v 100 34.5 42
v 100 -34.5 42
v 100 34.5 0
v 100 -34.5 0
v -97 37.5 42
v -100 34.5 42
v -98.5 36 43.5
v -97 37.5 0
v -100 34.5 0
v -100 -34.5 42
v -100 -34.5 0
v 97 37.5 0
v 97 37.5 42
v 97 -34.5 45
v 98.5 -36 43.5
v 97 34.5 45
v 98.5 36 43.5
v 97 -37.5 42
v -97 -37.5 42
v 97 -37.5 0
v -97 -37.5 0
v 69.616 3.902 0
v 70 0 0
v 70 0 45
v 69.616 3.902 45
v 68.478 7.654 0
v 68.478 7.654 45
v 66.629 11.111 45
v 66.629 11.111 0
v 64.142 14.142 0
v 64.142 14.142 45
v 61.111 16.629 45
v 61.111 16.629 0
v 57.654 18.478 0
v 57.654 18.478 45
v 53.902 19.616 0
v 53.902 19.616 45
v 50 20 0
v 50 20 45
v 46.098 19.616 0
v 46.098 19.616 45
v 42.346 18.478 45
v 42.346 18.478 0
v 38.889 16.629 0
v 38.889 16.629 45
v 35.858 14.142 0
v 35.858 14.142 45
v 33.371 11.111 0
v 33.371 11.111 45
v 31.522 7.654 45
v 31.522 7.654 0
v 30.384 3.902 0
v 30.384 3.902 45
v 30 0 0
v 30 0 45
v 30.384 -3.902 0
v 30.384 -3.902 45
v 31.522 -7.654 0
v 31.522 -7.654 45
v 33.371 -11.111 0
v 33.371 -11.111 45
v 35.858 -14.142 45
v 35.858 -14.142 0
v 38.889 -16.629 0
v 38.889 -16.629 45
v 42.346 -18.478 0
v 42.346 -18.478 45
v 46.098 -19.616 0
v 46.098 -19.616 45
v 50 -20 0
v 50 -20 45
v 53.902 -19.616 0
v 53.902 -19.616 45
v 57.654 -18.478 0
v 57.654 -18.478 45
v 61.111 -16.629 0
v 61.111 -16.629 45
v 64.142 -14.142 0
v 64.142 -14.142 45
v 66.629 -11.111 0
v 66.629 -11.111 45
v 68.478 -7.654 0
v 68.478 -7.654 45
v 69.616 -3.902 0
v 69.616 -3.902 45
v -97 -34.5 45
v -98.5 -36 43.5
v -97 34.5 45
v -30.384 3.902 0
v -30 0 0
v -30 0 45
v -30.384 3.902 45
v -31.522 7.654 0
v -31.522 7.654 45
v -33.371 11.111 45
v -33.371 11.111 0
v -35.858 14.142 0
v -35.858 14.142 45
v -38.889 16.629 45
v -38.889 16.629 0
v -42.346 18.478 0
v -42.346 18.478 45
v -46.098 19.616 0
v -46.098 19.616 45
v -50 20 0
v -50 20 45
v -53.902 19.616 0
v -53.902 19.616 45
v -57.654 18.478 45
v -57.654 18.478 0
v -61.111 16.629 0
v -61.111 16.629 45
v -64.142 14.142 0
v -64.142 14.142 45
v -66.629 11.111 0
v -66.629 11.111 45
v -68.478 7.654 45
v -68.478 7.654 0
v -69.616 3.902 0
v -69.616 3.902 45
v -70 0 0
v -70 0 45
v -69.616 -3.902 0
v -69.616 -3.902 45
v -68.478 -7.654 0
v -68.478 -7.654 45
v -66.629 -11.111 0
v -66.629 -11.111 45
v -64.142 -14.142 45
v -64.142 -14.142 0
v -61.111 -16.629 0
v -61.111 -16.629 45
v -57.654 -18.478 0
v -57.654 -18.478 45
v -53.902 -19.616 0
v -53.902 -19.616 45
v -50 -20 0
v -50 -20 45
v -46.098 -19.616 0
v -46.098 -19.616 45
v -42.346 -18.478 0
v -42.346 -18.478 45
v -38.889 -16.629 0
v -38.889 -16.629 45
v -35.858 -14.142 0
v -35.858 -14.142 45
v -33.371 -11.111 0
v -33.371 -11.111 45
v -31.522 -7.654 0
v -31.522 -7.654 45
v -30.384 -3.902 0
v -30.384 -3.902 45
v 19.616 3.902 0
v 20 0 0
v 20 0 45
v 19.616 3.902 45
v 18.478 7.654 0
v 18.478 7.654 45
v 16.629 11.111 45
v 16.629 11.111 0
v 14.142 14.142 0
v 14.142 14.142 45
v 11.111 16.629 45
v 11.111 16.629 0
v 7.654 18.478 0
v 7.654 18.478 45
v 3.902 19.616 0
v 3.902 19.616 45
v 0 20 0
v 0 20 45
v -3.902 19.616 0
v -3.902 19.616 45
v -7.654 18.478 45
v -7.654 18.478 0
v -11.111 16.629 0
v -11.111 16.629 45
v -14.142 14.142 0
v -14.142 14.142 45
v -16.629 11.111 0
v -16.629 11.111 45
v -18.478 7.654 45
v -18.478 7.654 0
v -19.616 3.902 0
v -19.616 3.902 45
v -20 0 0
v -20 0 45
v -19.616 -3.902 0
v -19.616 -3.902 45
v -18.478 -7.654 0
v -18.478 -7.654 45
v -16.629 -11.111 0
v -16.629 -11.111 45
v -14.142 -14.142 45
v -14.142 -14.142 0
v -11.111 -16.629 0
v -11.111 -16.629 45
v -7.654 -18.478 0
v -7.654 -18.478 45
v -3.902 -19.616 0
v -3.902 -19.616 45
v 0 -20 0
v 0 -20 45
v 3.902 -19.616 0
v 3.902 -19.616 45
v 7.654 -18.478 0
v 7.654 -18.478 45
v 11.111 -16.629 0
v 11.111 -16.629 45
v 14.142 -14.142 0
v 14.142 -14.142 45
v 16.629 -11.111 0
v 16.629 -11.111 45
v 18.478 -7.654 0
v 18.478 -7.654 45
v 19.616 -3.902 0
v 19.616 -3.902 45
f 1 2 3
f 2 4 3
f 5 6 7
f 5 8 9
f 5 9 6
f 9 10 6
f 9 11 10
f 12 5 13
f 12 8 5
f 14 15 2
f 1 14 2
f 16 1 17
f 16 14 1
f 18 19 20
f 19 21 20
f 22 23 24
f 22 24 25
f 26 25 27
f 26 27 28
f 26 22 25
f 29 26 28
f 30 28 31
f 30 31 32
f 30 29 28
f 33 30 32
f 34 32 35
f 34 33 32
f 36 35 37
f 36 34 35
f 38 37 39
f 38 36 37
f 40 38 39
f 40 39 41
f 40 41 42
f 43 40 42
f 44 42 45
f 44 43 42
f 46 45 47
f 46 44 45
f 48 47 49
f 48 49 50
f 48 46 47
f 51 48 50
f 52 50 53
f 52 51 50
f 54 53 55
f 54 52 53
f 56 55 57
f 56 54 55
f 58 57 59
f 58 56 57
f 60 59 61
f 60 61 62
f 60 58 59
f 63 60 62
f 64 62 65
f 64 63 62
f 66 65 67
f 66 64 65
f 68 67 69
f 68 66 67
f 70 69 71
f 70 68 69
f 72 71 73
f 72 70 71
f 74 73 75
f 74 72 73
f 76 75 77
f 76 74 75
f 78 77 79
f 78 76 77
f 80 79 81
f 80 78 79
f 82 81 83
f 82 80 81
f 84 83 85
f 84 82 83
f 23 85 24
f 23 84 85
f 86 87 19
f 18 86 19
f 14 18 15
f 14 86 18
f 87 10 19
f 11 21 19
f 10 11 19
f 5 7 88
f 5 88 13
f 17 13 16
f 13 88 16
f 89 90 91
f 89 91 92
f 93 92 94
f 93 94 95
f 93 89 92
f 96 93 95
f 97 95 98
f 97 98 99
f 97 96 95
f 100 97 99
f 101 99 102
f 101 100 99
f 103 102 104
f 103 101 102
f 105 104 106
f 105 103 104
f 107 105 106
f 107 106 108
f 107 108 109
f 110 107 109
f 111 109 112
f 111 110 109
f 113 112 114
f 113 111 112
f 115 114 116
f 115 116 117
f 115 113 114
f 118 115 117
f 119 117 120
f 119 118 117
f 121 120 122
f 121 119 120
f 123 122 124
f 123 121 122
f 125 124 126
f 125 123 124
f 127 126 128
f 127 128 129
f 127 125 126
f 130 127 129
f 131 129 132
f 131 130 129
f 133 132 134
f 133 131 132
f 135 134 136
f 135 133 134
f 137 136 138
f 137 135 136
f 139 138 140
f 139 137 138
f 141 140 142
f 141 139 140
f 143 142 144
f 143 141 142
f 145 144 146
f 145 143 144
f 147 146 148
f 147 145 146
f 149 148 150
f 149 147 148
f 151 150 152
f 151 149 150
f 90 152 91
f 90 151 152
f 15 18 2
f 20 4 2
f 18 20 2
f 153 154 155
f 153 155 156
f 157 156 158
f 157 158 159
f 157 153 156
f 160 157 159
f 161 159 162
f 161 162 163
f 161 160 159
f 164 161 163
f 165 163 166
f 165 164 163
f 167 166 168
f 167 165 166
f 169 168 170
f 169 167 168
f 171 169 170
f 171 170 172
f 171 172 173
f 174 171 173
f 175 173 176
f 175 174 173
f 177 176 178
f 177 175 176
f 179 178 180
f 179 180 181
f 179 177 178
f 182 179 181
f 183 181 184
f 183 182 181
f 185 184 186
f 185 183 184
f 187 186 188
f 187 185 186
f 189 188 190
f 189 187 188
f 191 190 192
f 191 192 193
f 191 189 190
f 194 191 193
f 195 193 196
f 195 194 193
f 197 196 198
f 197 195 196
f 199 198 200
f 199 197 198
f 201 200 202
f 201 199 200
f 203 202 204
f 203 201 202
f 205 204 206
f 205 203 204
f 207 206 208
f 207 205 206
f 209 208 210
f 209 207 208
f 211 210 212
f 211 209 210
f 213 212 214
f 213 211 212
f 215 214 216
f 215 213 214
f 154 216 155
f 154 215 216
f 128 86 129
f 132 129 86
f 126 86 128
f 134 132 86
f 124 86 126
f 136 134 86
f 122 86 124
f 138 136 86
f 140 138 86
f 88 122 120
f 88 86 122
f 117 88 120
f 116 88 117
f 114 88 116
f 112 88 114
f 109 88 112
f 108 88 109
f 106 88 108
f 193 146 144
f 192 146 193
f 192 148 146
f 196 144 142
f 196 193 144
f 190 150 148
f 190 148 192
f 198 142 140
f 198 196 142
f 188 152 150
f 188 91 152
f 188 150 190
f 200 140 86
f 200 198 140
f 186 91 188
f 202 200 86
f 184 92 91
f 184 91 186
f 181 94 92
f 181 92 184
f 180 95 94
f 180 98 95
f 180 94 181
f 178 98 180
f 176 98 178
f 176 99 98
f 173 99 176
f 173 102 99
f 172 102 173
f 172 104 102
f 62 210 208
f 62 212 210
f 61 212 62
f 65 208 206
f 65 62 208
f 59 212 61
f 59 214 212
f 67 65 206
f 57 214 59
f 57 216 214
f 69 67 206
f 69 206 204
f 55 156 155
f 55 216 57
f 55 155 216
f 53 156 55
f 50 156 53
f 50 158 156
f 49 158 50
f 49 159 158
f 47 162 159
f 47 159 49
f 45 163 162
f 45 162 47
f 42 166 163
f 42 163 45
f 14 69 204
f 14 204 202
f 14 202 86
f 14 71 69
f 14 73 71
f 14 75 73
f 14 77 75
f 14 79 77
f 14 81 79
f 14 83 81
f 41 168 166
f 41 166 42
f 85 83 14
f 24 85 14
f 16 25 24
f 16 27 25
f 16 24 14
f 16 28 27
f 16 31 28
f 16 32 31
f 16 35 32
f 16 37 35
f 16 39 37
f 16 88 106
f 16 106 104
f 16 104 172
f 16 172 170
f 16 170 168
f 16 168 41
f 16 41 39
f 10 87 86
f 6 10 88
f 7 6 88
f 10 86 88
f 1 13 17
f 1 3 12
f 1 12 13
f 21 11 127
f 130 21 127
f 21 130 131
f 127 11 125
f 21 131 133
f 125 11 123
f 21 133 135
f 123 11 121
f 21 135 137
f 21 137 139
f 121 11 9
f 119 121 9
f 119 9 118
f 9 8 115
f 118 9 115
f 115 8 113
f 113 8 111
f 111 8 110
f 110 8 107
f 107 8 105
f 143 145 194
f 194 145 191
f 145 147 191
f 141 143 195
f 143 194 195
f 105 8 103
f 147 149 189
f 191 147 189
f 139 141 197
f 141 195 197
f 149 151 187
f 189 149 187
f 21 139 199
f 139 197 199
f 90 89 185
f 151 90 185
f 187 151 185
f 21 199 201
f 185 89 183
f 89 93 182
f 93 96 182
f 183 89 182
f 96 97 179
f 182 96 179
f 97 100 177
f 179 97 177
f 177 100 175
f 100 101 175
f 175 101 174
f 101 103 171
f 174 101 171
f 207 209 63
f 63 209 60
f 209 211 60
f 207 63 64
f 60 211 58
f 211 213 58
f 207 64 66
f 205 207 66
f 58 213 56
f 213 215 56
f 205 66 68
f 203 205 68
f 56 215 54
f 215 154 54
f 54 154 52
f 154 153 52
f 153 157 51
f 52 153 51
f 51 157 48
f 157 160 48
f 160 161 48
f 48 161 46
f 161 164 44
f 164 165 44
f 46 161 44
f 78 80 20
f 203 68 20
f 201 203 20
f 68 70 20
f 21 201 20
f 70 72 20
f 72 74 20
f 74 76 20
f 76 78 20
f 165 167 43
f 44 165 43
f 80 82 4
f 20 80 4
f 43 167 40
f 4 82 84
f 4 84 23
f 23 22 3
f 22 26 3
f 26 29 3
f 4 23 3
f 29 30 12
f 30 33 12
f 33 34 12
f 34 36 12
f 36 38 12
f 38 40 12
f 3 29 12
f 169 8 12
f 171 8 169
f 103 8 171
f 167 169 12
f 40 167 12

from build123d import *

# Parameters (mm, degrees)
SKETCH_W        = 200
SKETCH_H        = 75
SKETCH_R        = 20
PAD_DEPTH       = 45
CHAMFER_SIZE    = 3
CHAMFER001_SIZE = 3


with BuildPart() as part:
    # Sketch → Pad (new body)
    with BuildSketch(Plane.XY):
        Rectangle(SKETCH_W, SKETCH_H)
        Circle(SKETCH_R, mode=Mode.SUBTRACT)
        with Locations((-50, 0)):
            Circle(SKETCH_R, mode=Mode.SUBTRACT)
        with Locations((50, 0)):
            Circle(SKETCH_R, mode=Mode.SUBTRACT)
    extrude(amount=PAD_DEPTH)

    # Chamfer
    chamfer_edges = [part.edges().sort_by_distance(p)[0] for p in [
        (100, 0, 45),
        (0, 37.5, 45),
        (-100, 0, 45),
        (0, -37.5, 45),
    ]]
    chamfer(chamfer_edges, length=CHAMFER_SIZE)

    # Chamfer001
    chamfer001_edges = [part.edges().sort_by_distance(p)[0] for p in [
        (100, 37.5, 21),
        (100, -37.5, 21),
        (-100, -37.5, 21),
        (-100, 37.5, 21),
    ]]
    chamfer(chamfer001_edges, length=CHAMFER001_SIZE)


solid = part.part
